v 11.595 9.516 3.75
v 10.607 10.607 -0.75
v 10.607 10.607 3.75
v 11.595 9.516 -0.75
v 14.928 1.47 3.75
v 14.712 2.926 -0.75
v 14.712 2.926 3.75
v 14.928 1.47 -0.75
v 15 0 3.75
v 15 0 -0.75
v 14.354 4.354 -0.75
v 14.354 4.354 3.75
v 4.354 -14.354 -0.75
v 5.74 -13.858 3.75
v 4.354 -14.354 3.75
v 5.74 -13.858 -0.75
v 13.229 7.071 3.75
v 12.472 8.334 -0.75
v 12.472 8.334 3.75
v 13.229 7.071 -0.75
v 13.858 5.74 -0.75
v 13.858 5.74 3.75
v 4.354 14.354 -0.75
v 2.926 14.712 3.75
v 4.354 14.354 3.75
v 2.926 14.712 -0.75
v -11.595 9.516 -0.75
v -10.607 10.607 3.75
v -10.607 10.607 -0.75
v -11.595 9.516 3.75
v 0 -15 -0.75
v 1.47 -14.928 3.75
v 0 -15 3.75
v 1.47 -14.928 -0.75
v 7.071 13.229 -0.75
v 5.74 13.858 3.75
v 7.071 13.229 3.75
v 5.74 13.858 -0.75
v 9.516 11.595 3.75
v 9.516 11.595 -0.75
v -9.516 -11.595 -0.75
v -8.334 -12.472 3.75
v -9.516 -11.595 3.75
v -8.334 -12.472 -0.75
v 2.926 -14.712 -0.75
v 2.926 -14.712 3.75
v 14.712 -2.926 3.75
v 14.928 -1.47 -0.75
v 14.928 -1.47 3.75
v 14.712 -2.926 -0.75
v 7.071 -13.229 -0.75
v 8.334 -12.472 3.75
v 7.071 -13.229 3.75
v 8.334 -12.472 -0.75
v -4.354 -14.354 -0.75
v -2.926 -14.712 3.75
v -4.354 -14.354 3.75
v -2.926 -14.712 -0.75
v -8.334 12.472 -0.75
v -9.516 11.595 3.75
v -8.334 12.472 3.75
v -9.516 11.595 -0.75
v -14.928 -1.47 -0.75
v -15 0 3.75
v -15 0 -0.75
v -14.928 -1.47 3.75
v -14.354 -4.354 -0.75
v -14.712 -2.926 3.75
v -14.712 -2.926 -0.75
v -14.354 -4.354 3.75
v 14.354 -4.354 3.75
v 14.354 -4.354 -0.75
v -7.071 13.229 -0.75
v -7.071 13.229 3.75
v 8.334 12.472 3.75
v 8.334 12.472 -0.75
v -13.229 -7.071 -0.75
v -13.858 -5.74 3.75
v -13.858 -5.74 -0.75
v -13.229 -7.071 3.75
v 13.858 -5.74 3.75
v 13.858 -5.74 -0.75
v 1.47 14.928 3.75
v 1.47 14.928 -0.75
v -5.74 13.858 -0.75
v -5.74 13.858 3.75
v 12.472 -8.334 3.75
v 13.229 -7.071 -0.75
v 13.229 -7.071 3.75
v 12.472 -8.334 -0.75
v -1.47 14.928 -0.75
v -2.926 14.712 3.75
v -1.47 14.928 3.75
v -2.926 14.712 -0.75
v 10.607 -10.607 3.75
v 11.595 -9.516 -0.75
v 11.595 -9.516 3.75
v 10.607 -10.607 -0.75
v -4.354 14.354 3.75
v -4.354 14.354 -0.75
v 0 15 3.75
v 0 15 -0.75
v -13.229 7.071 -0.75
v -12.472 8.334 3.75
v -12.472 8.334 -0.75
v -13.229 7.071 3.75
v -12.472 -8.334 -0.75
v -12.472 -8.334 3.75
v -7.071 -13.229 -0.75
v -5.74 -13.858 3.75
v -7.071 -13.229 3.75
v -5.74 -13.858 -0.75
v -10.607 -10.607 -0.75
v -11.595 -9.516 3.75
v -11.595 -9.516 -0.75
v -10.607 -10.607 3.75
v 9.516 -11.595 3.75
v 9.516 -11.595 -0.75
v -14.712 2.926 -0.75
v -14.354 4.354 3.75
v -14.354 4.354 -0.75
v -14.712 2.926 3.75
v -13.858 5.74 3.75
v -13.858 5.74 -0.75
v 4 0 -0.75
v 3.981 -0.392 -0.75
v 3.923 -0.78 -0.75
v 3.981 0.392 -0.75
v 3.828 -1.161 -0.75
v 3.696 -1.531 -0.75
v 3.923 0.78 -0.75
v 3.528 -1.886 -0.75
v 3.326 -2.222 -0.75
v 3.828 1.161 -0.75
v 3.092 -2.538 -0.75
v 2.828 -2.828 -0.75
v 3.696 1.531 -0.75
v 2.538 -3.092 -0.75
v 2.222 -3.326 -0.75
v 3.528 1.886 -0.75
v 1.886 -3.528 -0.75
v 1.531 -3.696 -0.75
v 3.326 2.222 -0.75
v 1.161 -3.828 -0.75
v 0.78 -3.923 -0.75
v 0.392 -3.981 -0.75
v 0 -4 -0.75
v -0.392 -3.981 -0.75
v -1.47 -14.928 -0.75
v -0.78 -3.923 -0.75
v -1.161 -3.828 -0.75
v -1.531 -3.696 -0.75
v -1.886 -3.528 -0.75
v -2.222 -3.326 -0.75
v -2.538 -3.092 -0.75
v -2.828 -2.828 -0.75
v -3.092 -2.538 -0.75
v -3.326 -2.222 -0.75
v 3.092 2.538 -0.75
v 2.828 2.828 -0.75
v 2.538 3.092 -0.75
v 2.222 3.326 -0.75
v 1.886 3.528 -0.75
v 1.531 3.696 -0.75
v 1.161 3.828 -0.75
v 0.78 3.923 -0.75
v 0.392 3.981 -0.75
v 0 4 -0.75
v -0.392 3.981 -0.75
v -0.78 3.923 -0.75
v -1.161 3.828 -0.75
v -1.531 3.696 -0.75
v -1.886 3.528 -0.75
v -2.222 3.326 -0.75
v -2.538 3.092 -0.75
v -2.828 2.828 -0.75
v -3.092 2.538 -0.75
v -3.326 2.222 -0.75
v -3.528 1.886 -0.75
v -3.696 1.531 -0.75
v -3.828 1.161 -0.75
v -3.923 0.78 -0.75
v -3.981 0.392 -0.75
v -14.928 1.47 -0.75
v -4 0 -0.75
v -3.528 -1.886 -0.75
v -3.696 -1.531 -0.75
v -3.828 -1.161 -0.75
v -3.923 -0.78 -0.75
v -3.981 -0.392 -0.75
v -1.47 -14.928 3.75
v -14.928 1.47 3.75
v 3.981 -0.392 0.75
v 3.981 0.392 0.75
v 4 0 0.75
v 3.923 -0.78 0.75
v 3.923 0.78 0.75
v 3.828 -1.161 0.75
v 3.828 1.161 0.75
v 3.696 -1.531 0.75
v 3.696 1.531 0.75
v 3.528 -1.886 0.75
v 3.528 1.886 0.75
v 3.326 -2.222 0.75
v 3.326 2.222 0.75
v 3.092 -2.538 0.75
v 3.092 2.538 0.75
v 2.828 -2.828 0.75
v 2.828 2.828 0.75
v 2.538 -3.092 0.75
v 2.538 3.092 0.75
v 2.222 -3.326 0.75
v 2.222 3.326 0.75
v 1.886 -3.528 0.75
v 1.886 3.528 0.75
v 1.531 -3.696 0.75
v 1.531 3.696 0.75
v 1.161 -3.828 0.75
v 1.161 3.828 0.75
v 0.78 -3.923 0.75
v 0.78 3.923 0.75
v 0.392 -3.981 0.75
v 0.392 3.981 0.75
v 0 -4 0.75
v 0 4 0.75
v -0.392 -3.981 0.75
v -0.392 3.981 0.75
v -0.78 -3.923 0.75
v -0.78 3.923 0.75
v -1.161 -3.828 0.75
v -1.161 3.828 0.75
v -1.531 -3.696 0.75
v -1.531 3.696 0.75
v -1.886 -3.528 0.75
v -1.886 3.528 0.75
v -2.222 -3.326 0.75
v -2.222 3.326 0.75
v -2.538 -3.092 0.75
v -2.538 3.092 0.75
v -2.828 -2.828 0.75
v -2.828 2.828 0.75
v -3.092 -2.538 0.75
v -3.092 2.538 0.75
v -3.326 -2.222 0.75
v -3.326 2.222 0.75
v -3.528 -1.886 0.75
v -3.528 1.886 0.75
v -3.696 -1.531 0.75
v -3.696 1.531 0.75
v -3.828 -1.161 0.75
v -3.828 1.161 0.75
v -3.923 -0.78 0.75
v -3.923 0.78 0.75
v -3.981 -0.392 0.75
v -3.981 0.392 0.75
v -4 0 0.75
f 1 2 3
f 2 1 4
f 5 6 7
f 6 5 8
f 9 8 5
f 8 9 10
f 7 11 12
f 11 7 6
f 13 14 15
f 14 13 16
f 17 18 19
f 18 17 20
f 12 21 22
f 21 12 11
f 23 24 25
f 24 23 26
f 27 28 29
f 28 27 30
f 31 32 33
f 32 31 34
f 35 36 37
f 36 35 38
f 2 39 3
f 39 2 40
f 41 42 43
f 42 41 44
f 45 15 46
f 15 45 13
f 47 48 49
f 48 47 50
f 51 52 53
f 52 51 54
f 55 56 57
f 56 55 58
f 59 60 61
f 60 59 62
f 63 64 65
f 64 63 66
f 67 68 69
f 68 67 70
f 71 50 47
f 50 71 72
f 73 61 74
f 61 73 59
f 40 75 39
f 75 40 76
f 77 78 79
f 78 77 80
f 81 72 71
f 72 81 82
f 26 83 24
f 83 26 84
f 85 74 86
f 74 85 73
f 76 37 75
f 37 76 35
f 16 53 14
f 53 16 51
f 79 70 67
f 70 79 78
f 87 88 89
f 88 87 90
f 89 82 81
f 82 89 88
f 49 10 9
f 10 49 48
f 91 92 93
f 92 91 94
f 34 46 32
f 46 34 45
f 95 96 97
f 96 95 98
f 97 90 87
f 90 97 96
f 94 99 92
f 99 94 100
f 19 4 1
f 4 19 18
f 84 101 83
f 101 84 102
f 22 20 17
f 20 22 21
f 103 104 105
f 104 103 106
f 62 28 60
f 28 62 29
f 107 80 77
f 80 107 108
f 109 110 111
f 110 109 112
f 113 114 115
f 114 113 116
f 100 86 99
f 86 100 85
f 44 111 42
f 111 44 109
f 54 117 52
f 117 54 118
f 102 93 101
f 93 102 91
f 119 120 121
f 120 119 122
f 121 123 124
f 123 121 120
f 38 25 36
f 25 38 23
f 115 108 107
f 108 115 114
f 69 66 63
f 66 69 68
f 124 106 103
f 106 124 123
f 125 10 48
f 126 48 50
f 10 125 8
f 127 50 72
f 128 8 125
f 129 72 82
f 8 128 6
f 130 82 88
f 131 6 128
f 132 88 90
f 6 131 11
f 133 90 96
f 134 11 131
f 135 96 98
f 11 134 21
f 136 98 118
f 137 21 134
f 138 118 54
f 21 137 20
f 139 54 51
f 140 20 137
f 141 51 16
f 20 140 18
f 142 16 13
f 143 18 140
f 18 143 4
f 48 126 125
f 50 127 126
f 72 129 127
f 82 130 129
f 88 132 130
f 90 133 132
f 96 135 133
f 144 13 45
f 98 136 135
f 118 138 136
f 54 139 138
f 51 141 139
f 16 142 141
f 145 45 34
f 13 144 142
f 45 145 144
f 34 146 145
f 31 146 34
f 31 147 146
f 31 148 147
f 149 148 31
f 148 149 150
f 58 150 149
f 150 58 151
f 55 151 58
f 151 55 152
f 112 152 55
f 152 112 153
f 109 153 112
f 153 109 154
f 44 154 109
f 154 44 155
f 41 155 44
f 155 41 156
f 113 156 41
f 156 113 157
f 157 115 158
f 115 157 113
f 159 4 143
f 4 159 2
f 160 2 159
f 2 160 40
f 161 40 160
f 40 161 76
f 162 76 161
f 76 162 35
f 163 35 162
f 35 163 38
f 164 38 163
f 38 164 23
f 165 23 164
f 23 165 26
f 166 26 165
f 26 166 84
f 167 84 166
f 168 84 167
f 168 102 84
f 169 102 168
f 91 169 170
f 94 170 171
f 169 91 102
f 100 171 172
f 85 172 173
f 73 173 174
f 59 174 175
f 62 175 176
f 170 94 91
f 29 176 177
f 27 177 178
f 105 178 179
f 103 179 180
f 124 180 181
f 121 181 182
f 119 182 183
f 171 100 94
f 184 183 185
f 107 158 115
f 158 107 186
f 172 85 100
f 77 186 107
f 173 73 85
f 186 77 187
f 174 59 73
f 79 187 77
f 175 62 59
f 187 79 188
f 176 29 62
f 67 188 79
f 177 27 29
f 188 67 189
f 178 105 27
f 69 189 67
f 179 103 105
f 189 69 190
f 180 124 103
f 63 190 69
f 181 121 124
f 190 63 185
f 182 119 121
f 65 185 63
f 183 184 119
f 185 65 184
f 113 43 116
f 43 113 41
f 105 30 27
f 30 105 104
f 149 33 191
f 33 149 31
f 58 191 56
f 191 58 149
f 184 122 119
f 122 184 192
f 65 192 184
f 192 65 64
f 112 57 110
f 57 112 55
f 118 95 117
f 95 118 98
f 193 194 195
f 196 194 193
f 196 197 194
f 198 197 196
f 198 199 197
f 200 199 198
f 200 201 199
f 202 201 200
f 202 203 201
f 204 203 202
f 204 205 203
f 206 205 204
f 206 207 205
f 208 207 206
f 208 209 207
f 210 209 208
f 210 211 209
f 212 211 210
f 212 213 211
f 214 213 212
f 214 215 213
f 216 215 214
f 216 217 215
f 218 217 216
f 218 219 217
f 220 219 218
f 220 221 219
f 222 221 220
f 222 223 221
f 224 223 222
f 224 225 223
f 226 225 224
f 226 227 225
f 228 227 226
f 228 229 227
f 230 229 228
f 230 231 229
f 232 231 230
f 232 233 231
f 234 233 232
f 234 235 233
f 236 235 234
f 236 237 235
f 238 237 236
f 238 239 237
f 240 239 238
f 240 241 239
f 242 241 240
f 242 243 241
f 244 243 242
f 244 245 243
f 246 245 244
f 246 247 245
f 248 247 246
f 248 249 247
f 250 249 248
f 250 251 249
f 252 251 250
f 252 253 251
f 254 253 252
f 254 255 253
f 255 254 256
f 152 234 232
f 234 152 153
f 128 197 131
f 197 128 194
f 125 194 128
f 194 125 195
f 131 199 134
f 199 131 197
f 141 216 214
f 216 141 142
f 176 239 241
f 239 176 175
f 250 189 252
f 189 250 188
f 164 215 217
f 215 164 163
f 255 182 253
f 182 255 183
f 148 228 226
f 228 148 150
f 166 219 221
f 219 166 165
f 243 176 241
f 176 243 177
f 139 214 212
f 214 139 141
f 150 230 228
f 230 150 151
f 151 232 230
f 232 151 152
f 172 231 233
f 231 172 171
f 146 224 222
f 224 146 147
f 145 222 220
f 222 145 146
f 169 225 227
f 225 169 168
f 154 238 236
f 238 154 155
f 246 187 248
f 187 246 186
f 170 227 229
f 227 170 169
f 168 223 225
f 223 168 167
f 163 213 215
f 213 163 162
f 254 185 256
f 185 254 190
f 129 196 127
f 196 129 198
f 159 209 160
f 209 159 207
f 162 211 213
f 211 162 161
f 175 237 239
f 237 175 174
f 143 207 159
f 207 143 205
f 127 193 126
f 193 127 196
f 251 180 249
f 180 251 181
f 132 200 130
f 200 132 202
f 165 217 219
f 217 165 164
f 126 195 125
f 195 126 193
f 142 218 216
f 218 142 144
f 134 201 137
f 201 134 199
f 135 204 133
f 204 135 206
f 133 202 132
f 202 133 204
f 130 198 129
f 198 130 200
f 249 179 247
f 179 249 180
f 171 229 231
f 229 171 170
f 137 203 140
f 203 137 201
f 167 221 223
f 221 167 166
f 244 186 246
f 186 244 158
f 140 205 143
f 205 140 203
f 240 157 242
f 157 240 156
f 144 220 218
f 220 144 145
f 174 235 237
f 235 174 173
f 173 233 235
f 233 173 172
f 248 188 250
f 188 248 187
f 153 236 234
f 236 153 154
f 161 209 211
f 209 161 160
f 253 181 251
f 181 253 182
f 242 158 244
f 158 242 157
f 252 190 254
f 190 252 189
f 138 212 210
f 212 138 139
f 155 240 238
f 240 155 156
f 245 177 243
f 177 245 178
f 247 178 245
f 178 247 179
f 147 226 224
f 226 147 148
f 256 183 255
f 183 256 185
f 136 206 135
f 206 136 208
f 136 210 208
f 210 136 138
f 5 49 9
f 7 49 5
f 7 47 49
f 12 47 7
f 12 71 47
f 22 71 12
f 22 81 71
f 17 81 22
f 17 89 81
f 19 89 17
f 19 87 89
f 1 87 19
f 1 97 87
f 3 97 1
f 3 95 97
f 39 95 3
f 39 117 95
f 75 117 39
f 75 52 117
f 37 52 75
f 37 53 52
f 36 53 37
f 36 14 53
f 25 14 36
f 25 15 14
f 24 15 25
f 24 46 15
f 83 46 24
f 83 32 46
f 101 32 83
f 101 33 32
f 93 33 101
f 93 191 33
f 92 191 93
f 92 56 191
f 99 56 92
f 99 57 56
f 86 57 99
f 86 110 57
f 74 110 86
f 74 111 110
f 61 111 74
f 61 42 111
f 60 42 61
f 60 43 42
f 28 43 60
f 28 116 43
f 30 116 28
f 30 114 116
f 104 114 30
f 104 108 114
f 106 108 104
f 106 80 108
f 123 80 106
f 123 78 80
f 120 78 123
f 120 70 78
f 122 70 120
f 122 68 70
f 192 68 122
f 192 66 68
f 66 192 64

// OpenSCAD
// Parameters
inner_diameter_mm = 8.0; //[4.0:16.0:0.1]
outer_diameter_mm = 30.0; //[15.0:60.0:0.1]
thickness_mm = 1.5; //[0.75:3.0:0.05]
eps_mm = 0.8; //[0.5:2.0:0.1]

// Penny Washer - complete geometry
module penny_washer() {
  color("Silver") {
    difference() {
      // Outer cylinder
      cylinder(r=outer_diameter_mm/2, h=thickness_mm, center=true, $fn=64);
      // Inner hole
      cylinder(r=inner_diameter_mm/2, h=thickness_mm + 2*eps_mm, center=true, $fn=64);
    }
  }
}

// Screw And Washer - placeholder geometry
module screw_and_washer() {
  color("DimGray") {
    // Placeholder for screw and washer
    translate([0, 0, thickness_mm/2 + 1]) {
      cylinder(r=outer_diameter_mm/4, h=thickness_mm, center=true, $fn=32);
    }
  }
}

// Round Grommet Top - complete geometry
module round_grommet_top() {
  color("Black") {
    // Grommet top
    translate([0, 0, thickness_mm]) {
      cylinder(r=outer_diameter_mm/2, h=thickness_mm, center=true, $fn=64);
    }
  }
}

// Round Grommet Assembly - complete geometry
module round_grommet_assembly() {
  color("Black") {
    // Grommet assembly
    translate([0, 0, thickness_mm * 2]) {
      cylinder(r=outer_diameter_mm/2, h=thickness_mm, center=true, $fn=64);
    }
  }
}

// Assembly
module assembly() {
  penny_washer();
  screw_and_washer();
  round_grommet_top();
  round_grommet_assembly();
}

assembly();
